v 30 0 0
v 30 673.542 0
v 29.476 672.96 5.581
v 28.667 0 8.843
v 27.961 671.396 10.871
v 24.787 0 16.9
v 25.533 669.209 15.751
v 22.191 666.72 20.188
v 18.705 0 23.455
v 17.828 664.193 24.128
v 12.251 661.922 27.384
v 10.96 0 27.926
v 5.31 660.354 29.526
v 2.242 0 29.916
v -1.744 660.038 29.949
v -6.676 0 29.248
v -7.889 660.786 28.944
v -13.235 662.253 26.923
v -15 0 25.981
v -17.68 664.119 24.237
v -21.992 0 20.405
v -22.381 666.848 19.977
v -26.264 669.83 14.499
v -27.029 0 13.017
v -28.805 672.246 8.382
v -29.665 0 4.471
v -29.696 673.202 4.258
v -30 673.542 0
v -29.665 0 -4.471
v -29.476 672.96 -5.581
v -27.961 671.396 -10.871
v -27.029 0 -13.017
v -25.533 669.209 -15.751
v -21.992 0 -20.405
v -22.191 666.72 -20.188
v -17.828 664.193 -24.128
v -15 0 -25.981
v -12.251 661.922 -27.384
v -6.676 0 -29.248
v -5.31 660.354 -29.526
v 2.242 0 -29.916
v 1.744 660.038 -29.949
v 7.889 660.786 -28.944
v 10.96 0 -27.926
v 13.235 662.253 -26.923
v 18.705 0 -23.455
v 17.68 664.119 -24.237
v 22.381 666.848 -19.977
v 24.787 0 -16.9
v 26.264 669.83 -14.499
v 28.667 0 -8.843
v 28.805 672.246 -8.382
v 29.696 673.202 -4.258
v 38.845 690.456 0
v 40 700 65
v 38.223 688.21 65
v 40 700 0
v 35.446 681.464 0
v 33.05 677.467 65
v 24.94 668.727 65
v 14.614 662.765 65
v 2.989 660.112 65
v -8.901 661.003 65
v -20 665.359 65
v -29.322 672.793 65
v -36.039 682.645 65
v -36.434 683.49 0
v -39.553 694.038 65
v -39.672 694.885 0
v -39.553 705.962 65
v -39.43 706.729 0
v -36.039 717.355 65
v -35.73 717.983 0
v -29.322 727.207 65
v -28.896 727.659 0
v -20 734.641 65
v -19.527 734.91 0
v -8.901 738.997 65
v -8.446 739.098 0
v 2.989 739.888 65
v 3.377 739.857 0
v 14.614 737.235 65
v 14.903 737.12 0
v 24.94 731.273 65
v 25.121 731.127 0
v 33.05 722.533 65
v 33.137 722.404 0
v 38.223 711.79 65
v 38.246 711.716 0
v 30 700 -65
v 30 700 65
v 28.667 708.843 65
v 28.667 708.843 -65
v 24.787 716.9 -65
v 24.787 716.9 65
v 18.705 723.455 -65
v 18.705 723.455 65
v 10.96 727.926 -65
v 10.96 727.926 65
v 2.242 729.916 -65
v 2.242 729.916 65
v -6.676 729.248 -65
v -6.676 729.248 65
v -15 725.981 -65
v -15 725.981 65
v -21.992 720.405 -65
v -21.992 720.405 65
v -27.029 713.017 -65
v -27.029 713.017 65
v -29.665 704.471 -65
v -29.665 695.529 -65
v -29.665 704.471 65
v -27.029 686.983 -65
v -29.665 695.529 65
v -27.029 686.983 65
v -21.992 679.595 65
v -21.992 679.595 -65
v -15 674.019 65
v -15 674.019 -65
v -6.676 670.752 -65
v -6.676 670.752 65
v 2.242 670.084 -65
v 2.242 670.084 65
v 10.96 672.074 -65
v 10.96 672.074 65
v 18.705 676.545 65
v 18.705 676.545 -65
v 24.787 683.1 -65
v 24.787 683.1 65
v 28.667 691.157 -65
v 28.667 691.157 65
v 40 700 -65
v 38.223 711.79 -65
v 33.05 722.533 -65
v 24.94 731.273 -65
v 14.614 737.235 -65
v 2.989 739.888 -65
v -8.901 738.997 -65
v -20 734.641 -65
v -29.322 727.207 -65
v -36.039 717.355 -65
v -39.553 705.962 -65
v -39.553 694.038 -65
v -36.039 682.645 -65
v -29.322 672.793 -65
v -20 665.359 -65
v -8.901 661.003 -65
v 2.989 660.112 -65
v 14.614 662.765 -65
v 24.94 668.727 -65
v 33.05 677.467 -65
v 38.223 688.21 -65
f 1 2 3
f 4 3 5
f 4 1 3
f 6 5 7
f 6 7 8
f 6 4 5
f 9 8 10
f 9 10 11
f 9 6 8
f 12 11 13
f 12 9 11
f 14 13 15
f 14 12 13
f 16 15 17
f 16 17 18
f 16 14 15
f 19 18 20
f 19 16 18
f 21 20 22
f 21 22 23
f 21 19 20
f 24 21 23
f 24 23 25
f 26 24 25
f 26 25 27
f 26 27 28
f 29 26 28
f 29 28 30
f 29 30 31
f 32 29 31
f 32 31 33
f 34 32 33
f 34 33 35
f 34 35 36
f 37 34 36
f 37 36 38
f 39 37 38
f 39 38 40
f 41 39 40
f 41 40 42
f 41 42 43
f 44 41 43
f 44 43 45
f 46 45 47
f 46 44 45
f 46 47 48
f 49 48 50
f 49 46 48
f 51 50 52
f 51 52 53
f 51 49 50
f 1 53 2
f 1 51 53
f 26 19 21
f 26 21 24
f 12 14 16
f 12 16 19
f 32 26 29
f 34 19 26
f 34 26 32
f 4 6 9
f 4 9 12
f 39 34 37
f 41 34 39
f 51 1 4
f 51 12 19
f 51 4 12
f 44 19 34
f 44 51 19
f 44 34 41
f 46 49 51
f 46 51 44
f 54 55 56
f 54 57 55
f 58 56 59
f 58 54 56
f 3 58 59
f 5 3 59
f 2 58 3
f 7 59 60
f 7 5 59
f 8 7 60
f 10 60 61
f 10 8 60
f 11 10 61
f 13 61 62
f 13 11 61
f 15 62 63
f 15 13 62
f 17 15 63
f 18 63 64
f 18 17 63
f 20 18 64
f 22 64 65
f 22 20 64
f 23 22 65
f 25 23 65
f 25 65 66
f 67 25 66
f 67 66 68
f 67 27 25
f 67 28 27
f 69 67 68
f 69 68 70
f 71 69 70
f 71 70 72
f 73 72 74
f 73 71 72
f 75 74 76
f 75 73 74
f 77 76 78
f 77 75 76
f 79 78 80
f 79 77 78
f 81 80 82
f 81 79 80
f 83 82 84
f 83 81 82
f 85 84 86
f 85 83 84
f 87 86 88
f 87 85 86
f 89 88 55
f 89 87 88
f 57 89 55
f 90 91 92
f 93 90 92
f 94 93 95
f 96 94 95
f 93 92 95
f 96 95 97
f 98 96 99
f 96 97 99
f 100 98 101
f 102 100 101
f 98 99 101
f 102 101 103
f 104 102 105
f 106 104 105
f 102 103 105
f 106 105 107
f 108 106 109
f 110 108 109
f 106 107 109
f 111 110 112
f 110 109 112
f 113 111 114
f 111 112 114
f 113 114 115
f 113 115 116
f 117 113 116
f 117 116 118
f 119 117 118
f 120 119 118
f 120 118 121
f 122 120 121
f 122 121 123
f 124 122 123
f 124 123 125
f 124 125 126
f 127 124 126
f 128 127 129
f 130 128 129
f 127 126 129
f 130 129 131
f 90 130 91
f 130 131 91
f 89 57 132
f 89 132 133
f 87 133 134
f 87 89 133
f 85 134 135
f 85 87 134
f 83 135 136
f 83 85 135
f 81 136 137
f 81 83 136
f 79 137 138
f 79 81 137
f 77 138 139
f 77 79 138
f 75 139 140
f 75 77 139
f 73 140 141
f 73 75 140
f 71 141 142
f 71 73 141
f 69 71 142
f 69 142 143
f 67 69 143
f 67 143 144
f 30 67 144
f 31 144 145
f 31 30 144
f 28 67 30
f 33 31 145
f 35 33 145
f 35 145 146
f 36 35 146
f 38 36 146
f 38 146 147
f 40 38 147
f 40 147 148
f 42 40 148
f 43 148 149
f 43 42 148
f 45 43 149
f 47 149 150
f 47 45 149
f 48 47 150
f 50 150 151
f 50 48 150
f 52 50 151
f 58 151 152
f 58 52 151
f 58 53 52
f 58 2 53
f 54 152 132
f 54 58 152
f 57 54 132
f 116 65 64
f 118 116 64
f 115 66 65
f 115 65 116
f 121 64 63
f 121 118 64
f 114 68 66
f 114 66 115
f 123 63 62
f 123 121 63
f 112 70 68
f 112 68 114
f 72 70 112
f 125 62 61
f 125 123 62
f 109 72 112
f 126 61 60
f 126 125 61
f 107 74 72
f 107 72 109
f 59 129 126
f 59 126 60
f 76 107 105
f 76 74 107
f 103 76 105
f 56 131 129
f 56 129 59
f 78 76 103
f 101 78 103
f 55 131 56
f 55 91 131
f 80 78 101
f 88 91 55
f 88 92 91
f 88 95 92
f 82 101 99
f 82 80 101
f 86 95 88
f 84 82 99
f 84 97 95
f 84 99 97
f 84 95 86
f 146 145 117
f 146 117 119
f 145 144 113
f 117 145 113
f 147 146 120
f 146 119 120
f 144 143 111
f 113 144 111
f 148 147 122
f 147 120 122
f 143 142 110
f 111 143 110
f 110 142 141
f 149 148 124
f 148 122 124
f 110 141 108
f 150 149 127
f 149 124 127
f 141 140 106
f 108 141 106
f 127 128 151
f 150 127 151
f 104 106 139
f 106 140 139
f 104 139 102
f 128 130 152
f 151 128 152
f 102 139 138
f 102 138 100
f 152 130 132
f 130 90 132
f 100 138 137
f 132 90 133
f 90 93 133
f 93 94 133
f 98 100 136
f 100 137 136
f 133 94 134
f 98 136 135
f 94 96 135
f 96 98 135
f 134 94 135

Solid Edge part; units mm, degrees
sketch "Sketch1" plane through (0, 0, 0) normal (0, -1, 0) x (1, 0, 0)
  circle A0 centre (0, 0) radius 30
  dimension "D1" = 60
extrude "ExtrudedProtrusion_1" add sketch "Sketch1" against normal blind 700
sketch "Sketch2" plane through (0, 0, 0) normal (0, 0, 1) x (1, 0, 0)
  circle A0 centre (0, 700) radius 40
extrude "Protrusion1" add sketch "Sketch2" along normal mid plane 130
sketch "Sketch3" plane through (0, 528, 65) normal (0, 0, 1) x (1, 0, 0)
  circle A0 centre (0, 172) radius 30
extrude "Cutout1" cut sketch "Sketch3" against normal through all
